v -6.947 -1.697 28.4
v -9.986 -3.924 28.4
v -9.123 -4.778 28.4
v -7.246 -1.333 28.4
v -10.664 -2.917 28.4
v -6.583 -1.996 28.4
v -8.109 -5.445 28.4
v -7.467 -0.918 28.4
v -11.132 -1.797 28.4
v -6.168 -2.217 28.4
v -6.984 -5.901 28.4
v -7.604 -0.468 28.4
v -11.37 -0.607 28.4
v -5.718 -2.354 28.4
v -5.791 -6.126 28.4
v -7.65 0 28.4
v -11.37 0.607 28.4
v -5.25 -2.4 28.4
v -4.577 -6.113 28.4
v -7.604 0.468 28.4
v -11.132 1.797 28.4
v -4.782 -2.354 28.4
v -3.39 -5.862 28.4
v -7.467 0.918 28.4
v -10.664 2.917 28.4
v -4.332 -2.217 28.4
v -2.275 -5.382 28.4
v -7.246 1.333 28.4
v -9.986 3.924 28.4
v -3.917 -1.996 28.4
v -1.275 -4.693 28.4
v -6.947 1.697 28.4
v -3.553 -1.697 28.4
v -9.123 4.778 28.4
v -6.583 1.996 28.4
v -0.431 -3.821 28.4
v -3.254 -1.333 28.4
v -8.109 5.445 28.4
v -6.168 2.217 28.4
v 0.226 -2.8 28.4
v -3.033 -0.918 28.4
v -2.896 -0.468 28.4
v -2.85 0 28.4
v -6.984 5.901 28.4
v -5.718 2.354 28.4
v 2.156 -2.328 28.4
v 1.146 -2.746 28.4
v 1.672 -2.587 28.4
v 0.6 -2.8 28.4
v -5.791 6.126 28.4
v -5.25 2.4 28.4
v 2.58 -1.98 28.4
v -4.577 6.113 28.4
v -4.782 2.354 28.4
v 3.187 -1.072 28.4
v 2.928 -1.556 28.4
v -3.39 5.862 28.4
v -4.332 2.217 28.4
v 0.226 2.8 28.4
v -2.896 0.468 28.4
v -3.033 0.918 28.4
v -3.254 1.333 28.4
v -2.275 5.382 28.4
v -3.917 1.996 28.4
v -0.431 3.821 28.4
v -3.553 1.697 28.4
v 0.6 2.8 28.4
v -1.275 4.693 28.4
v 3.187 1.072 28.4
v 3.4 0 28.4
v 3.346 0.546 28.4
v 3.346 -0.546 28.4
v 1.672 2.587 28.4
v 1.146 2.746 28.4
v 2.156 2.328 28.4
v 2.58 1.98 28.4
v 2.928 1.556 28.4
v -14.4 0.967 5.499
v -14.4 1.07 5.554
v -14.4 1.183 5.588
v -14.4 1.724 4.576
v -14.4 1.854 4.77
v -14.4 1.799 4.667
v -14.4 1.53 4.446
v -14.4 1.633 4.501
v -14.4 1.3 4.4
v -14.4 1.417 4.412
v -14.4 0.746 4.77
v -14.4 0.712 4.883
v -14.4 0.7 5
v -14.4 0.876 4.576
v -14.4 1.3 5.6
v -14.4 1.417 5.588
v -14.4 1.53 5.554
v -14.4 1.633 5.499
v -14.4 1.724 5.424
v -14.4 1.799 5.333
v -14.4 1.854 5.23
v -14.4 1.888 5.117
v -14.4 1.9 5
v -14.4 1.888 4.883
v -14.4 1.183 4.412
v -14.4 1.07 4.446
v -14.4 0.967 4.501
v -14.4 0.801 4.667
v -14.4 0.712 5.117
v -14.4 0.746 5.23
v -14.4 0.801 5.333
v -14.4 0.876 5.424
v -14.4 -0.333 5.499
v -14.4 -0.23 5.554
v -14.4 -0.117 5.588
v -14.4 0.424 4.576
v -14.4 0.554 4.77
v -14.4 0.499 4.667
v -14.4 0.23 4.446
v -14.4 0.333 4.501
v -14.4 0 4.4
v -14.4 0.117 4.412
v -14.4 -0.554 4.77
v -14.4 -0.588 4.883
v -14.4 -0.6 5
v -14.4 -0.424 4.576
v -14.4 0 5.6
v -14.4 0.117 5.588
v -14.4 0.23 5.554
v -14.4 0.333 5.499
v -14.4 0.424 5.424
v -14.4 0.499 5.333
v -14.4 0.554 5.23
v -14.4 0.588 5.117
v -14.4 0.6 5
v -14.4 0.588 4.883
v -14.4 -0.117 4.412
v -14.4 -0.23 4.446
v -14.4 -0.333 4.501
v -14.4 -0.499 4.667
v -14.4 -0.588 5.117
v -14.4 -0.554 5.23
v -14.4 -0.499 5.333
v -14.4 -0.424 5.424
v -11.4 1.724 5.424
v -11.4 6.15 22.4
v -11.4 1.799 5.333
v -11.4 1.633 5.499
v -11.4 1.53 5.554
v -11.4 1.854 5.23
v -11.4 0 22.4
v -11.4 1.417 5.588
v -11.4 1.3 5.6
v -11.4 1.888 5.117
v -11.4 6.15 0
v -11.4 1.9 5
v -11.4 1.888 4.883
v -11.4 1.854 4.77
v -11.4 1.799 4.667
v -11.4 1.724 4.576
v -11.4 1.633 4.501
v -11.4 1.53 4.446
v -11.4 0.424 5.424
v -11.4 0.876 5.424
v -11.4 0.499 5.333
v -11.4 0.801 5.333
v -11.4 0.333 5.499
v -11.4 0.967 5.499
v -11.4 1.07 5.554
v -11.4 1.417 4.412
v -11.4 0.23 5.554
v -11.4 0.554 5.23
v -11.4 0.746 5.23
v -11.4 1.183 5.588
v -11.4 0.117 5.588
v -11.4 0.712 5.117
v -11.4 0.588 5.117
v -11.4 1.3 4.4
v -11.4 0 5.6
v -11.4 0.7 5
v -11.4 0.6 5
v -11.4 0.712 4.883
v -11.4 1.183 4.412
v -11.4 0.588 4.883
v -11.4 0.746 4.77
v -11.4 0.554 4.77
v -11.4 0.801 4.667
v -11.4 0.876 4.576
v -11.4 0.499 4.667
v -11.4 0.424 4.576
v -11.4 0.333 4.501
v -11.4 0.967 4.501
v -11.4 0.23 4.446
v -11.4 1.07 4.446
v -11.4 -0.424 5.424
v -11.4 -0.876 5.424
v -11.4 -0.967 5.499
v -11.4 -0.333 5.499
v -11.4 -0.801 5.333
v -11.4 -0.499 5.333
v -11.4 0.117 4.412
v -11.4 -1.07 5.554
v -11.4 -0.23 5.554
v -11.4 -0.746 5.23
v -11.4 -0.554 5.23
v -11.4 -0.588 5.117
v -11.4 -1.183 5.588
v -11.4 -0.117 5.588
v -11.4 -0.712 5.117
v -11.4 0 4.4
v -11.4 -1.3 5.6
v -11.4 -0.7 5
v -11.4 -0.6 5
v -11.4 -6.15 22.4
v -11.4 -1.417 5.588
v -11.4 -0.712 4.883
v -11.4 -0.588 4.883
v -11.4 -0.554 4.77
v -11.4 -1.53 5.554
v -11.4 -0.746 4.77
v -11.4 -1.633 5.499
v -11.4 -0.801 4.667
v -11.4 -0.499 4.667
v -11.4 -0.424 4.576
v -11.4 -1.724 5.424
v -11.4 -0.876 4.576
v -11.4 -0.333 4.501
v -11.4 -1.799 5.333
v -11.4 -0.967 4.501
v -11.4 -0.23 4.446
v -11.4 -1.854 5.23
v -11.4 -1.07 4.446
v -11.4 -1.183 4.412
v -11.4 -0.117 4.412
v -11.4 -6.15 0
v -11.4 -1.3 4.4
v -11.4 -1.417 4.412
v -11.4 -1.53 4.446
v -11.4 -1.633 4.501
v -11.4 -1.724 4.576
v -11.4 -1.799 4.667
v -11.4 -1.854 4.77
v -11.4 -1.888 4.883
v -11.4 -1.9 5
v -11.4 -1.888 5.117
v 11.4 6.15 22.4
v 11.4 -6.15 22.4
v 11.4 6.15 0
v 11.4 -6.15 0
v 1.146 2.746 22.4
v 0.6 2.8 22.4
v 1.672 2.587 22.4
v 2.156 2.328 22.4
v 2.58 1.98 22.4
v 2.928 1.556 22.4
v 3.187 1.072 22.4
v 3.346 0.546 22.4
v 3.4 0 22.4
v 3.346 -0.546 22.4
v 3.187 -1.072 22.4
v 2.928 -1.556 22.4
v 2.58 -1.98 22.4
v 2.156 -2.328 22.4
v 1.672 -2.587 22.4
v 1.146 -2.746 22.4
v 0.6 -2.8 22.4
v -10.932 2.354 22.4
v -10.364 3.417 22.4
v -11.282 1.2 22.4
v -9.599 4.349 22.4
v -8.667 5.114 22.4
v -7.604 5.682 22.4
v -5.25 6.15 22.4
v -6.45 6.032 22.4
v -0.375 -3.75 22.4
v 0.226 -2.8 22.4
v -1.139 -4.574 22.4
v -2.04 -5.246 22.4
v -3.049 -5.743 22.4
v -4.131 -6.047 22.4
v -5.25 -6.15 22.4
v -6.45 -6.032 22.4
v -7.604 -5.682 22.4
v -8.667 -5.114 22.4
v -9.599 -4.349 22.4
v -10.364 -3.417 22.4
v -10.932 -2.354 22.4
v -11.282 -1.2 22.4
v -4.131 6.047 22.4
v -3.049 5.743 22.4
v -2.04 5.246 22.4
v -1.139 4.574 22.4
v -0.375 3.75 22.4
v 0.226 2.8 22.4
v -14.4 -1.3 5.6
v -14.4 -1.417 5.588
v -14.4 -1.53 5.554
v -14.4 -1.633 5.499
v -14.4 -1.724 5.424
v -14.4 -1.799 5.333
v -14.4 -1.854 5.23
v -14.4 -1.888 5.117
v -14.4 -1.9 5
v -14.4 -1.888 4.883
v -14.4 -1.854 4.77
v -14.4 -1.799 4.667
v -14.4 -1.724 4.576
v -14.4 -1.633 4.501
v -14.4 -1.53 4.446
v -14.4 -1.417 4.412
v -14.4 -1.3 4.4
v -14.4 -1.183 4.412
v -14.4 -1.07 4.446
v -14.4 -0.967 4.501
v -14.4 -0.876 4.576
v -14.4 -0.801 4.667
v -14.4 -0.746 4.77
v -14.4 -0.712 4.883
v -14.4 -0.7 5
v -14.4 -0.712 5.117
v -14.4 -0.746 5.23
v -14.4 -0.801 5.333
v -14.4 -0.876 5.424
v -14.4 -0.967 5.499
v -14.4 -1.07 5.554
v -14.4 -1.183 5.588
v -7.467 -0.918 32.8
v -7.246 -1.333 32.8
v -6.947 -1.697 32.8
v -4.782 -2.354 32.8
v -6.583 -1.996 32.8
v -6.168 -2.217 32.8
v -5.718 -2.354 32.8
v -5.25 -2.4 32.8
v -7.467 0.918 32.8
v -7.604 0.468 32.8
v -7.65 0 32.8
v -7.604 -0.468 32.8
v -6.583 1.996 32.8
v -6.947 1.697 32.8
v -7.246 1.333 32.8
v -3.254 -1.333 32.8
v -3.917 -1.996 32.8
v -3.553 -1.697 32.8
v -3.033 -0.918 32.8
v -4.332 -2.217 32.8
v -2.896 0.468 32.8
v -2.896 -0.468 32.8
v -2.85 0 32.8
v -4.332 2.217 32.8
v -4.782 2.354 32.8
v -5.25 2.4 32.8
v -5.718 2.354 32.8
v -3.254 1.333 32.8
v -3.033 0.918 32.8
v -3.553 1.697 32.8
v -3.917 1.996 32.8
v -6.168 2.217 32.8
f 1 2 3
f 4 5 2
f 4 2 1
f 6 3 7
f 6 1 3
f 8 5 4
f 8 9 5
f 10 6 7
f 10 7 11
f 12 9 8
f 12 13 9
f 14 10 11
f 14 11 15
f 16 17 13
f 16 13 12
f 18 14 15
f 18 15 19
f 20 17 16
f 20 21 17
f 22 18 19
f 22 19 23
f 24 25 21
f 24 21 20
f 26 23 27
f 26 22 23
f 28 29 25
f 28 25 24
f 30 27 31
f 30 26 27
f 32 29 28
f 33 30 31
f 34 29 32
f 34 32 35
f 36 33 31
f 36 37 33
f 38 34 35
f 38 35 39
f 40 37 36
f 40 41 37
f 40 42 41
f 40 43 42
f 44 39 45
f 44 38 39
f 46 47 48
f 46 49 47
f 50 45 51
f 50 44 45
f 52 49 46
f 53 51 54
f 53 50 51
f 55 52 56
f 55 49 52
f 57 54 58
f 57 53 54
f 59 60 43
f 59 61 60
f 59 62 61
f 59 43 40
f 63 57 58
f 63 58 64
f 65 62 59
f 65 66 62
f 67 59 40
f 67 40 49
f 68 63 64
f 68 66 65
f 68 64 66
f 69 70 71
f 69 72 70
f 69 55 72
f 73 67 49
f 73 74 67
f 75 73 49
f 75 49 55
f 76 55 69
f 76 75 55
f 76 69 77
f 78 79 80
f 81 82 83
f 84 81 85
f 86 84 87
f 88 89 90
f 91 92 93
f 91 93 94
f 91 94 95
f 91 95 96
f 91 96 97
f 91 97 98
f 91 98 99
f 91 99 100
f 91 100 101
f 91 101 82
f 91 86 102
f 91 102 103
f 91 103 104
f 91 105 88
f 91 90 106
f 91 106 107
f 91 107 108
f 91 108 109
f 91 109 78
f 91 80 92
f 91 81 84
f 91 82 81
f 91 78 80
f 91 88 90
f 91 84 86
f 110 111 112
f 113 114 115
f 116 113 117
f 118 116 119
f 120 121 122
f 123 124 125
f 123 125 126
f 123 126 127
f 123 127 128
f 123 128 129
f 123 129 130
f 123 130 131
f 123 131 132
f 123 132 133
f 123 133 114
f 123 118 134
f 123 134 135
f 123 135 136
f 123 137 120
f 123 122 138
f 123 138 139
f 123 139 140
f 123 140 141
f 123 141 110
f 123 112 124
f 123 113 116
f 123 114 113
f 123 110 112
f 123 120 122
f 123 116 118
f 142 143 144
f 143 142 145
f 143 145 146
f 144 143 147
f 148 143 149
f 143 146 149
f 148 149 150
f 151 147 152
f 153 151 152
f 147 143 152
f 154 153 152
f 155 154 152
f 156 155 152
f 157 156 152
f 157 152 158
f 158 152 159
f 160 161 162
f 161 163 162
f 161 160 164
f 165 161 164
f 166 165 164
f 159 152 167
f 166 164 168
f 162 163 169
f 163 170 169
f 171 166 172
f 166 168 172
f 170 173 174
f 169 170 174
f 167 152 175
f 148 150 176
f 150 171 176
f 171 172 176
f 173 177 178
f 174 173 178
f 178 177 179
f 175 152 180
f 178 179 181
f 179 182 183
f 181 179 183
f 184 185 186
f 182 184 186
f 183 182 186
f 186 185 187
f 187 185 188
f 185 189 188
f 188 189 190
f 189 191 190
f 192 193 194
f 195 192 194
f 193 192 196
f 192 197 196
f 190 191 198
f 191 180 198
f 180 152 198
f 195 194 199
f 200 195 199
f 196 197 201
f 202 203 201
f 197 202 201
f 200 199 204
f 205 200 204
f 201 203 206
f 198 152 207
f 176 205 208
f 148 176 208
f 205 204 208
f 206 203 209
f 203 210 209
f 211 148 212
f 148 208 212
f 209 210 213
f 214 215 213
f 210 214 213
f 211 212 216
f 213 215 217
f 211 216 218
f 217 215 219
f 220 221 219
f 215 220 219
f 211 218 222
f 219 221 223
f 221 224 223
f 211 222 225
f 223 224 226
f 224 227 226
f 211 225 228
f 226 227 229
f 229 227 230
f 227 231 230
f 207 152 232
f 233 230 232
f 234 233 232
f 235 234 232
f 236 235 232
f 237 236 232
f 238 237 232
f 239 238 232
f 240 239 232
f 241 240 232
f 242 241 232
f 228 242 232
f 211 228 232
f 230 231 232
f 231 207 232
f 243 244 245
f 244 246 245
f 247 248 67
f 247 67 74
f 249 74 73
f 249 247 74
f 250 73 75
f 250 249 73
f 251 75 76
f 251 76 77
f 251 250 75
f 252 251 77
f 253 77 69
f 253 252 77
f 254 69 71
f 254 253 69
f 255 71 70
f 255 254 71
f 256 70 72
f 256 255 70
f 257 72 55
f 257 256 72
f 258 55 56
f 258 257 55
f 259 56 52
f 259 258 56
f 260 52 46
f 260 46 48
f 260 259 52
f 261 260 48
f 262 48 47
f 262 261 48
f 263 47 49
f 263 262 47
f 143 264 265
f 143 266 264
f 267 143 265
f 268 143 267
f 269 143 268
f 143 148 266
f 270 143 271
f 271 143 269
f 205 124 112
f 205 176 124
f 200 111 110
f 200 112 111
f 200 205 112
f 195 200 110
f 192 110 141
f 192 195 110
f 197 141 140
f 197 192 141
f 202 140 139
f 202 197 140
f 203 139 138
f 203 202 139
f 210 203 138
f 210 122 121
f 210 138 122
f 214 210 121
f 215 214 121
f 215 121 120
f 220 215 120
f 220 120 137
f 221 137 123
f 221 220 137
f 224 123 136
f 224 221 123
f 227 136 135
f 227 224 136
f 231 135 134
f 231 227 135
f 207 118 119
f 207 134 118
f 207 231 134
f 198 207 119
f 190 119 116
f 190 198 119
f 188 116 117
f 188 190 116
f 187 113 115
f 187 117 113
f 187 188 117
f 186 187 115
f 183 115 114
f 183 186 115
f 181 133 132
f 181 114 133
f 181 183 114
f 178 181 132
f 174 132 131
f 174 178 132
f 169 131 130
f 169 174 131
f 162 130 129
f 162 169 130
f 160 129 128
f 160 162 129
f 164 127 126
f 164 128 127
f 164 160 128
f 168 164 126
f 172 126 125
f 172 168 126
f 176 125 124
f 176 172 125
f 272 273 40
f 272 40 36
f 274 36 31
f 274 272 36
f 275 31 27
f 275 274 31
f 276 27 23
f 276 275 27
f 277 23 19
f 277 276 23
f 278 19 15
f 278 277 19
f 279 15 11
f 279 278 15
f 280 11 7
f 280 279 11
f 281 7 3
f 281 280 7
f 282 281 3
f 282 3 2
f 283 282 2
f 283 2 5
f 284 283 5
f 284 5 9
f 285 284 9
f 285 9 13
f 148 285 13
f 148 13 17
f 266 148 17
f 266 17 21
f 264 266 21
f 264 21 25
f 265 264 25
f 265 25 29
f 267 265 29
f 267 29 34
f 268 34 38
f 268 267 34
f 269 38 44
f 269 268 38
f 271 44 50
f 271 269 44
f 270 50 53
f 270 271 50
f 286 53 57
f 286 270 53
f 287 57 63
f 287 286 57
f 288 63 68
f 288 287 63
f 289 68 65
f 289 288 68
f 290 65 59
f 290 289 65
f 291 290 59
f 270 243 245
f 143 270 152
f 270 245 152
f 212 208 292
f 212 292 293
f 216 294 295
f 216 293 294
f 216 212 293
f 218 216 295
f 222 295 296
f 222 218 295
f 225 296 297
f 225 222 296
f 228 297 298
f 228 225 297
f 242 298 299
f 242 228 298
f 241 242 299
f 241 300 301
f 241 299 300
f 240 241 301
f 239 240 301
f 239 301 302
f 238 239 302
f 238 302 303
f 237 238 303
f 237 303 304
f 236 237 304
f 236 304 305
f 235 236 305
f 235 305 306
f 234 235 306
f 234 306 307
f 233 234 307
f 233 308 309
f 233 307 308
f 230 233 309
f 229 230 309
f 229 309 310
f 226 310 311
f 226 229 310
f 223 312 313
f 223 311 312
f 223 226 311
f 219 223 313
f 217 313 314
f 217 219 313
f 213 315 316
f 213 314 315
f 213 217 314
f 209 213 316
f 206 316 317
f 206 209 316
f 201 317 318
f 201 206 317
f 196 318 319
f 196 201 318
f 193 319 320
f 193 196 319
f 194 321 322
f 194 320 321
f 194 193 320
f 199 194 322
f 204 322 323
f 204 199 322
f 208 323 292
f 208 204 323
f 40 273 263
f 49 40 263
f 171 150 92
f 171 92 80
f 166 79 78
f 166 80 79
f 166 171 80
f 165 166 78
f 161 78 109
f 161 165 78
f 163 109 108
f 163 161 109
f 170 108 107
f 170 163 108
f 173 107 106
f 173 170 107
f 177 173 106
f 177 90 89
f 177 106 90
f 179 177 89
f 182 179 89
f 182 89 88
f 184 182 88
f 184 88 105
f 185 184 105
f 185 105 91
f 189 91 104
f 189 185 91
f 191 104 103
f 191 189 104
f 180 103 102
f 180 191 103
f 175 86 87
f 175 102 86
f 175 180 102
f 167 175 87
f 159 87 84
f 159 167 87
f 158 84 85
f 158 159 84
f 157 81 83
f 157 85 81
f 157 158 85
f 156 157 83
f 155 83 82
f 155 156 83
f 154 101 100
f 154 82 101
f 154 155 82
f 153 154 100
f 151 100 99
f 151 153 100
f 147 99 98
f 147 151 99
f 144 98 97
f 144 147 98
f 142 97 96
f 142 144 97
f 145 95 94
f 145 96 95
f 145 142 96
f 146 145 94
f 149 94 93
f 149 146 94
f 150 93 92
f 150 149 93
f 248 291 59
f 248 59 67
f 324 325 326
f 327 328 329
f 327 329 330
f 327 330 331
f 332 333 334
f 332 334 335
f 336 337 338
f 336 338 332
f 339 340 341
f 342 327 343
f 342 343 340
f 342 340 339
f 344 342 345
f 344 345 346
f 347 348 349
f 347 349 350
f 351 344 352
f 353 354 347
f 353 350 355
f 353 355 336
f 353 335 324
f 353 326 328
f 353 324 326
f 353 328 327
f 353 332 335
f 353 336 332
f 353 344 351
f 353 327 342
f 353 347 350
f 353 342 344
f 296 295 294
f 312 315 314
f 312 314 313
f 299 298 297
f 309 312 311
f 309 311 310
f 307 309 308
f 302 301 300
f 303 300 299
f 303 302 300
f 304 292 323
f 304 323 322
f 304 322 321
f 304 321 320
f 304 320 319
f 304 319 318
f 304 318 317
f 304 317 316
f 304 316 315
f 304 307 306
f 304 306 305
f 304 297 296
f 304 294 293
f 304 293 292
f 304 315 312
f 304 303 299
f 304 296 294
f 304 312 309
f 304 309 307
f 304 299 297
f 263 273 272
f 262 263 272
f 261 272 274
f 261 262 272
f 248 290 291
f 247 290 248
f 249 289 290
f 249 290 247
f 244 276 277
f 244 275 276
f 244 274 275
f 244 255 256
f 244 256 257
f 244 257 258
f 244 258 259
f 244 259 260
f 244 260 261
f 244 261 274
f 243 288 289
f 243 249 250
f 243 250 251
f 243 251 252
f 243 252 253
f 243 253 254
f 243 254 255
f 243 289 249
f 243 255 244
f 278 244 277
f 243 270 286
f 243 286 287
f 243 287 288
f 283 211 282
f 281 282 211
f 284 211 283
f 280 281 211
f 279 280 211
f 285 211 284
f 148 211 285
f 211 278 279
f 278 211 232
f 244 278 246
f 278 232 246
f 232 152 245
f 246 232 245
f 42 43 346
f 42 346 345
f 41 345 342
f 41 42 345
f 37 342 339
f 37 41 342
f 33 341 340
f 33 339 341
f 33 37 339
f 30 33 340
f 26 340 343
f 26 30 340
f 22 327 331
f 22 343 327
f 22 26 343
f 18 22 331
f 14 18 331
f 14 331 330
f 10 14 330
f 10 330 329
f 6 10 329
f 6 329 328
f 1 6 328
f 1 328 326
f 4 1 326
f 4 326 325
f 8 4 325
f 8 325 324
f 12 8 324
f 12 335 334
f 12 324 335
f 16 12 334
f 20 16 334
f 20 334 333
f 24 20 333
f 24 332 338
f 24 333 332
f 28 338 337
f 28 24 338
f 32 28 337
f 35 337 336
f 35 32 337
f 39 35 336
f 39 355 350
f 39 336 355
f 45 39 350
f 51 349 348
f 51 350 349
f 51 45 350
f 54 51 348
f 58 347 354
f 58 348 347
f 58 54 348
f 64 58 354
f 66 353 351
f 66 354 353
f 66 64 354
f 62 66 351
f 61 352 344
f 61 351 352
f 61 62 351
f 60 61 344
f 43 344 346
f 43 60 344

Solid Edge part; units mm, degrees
sketch "Sketch1" plane through (0, 0, 0) normal (0, 0, 1) x (1, 0, 0)
  line L0 (-11.4, -6.15) -> (11.4, -6.15)
  line L1 (11.4, -6.15) -> (11.4, 6.15)
  line L2 (11.4, 6.15) -> (-11.4, 6.15)
  line L3 (-11.4, 6.15) -> (-11.4, -6.15)
  dimension "D1" = 12.3
  dimension "D2" = 22.8
extrude "Protrusion1" add sketch "Sketch1" along normal blind 22.4
sketch "Sketch2" plane through (0, 0, 22.4) normal (0, 0, 1) x (1, 0, 0)
  arc A0 (0.2256, 2.8) -> (0.2256, -2.8) centre (-5.25, 0) ccw
  line L0 (0.2256, -2.8) -> (0.6, -2.8)
  arc A1 (0.6, 2.8) -> (0.6, -2.8) centre (0.6, 0) cw
  line L1 (0.2256, 2.8) -> (0.6, 2.8)
  dimension "D1" = 5.6
  dimension "D2" = 14.8
extrude "Extrusionsausprägung_2" add sketch "Sketch2" along normal blind 6
sketch "Sketch3" plane through (-4, 0, 28.4) normal (0, 0, 1) x (1, 0, 0)
  circle A0 centre (-1.25, 0) radius 2.4
  dimension "D1" = 4.8
extrude "Extrusionsausprägung_3" add sketch "Sketch3" along normal blind 4.4
sketch "Sketch4" plane through (-11.4, 0, 11.35) normal (-1, 0, 0) x (0, 0, 1)
  circle A0 centre (-6.35, -1.3) radius 0.6
  circle A1 centre (-6.35, 0) radius 0.6
  circle A2 centre (-6.35, 1.3) radius 0.6
  dimension "D1" = 1.3
  dimension "D2" = 1.2
  dimension "D3" = 5
extrude "Extrusionsausprägung_4" add sketch "Sketch4" along normal blind 3
